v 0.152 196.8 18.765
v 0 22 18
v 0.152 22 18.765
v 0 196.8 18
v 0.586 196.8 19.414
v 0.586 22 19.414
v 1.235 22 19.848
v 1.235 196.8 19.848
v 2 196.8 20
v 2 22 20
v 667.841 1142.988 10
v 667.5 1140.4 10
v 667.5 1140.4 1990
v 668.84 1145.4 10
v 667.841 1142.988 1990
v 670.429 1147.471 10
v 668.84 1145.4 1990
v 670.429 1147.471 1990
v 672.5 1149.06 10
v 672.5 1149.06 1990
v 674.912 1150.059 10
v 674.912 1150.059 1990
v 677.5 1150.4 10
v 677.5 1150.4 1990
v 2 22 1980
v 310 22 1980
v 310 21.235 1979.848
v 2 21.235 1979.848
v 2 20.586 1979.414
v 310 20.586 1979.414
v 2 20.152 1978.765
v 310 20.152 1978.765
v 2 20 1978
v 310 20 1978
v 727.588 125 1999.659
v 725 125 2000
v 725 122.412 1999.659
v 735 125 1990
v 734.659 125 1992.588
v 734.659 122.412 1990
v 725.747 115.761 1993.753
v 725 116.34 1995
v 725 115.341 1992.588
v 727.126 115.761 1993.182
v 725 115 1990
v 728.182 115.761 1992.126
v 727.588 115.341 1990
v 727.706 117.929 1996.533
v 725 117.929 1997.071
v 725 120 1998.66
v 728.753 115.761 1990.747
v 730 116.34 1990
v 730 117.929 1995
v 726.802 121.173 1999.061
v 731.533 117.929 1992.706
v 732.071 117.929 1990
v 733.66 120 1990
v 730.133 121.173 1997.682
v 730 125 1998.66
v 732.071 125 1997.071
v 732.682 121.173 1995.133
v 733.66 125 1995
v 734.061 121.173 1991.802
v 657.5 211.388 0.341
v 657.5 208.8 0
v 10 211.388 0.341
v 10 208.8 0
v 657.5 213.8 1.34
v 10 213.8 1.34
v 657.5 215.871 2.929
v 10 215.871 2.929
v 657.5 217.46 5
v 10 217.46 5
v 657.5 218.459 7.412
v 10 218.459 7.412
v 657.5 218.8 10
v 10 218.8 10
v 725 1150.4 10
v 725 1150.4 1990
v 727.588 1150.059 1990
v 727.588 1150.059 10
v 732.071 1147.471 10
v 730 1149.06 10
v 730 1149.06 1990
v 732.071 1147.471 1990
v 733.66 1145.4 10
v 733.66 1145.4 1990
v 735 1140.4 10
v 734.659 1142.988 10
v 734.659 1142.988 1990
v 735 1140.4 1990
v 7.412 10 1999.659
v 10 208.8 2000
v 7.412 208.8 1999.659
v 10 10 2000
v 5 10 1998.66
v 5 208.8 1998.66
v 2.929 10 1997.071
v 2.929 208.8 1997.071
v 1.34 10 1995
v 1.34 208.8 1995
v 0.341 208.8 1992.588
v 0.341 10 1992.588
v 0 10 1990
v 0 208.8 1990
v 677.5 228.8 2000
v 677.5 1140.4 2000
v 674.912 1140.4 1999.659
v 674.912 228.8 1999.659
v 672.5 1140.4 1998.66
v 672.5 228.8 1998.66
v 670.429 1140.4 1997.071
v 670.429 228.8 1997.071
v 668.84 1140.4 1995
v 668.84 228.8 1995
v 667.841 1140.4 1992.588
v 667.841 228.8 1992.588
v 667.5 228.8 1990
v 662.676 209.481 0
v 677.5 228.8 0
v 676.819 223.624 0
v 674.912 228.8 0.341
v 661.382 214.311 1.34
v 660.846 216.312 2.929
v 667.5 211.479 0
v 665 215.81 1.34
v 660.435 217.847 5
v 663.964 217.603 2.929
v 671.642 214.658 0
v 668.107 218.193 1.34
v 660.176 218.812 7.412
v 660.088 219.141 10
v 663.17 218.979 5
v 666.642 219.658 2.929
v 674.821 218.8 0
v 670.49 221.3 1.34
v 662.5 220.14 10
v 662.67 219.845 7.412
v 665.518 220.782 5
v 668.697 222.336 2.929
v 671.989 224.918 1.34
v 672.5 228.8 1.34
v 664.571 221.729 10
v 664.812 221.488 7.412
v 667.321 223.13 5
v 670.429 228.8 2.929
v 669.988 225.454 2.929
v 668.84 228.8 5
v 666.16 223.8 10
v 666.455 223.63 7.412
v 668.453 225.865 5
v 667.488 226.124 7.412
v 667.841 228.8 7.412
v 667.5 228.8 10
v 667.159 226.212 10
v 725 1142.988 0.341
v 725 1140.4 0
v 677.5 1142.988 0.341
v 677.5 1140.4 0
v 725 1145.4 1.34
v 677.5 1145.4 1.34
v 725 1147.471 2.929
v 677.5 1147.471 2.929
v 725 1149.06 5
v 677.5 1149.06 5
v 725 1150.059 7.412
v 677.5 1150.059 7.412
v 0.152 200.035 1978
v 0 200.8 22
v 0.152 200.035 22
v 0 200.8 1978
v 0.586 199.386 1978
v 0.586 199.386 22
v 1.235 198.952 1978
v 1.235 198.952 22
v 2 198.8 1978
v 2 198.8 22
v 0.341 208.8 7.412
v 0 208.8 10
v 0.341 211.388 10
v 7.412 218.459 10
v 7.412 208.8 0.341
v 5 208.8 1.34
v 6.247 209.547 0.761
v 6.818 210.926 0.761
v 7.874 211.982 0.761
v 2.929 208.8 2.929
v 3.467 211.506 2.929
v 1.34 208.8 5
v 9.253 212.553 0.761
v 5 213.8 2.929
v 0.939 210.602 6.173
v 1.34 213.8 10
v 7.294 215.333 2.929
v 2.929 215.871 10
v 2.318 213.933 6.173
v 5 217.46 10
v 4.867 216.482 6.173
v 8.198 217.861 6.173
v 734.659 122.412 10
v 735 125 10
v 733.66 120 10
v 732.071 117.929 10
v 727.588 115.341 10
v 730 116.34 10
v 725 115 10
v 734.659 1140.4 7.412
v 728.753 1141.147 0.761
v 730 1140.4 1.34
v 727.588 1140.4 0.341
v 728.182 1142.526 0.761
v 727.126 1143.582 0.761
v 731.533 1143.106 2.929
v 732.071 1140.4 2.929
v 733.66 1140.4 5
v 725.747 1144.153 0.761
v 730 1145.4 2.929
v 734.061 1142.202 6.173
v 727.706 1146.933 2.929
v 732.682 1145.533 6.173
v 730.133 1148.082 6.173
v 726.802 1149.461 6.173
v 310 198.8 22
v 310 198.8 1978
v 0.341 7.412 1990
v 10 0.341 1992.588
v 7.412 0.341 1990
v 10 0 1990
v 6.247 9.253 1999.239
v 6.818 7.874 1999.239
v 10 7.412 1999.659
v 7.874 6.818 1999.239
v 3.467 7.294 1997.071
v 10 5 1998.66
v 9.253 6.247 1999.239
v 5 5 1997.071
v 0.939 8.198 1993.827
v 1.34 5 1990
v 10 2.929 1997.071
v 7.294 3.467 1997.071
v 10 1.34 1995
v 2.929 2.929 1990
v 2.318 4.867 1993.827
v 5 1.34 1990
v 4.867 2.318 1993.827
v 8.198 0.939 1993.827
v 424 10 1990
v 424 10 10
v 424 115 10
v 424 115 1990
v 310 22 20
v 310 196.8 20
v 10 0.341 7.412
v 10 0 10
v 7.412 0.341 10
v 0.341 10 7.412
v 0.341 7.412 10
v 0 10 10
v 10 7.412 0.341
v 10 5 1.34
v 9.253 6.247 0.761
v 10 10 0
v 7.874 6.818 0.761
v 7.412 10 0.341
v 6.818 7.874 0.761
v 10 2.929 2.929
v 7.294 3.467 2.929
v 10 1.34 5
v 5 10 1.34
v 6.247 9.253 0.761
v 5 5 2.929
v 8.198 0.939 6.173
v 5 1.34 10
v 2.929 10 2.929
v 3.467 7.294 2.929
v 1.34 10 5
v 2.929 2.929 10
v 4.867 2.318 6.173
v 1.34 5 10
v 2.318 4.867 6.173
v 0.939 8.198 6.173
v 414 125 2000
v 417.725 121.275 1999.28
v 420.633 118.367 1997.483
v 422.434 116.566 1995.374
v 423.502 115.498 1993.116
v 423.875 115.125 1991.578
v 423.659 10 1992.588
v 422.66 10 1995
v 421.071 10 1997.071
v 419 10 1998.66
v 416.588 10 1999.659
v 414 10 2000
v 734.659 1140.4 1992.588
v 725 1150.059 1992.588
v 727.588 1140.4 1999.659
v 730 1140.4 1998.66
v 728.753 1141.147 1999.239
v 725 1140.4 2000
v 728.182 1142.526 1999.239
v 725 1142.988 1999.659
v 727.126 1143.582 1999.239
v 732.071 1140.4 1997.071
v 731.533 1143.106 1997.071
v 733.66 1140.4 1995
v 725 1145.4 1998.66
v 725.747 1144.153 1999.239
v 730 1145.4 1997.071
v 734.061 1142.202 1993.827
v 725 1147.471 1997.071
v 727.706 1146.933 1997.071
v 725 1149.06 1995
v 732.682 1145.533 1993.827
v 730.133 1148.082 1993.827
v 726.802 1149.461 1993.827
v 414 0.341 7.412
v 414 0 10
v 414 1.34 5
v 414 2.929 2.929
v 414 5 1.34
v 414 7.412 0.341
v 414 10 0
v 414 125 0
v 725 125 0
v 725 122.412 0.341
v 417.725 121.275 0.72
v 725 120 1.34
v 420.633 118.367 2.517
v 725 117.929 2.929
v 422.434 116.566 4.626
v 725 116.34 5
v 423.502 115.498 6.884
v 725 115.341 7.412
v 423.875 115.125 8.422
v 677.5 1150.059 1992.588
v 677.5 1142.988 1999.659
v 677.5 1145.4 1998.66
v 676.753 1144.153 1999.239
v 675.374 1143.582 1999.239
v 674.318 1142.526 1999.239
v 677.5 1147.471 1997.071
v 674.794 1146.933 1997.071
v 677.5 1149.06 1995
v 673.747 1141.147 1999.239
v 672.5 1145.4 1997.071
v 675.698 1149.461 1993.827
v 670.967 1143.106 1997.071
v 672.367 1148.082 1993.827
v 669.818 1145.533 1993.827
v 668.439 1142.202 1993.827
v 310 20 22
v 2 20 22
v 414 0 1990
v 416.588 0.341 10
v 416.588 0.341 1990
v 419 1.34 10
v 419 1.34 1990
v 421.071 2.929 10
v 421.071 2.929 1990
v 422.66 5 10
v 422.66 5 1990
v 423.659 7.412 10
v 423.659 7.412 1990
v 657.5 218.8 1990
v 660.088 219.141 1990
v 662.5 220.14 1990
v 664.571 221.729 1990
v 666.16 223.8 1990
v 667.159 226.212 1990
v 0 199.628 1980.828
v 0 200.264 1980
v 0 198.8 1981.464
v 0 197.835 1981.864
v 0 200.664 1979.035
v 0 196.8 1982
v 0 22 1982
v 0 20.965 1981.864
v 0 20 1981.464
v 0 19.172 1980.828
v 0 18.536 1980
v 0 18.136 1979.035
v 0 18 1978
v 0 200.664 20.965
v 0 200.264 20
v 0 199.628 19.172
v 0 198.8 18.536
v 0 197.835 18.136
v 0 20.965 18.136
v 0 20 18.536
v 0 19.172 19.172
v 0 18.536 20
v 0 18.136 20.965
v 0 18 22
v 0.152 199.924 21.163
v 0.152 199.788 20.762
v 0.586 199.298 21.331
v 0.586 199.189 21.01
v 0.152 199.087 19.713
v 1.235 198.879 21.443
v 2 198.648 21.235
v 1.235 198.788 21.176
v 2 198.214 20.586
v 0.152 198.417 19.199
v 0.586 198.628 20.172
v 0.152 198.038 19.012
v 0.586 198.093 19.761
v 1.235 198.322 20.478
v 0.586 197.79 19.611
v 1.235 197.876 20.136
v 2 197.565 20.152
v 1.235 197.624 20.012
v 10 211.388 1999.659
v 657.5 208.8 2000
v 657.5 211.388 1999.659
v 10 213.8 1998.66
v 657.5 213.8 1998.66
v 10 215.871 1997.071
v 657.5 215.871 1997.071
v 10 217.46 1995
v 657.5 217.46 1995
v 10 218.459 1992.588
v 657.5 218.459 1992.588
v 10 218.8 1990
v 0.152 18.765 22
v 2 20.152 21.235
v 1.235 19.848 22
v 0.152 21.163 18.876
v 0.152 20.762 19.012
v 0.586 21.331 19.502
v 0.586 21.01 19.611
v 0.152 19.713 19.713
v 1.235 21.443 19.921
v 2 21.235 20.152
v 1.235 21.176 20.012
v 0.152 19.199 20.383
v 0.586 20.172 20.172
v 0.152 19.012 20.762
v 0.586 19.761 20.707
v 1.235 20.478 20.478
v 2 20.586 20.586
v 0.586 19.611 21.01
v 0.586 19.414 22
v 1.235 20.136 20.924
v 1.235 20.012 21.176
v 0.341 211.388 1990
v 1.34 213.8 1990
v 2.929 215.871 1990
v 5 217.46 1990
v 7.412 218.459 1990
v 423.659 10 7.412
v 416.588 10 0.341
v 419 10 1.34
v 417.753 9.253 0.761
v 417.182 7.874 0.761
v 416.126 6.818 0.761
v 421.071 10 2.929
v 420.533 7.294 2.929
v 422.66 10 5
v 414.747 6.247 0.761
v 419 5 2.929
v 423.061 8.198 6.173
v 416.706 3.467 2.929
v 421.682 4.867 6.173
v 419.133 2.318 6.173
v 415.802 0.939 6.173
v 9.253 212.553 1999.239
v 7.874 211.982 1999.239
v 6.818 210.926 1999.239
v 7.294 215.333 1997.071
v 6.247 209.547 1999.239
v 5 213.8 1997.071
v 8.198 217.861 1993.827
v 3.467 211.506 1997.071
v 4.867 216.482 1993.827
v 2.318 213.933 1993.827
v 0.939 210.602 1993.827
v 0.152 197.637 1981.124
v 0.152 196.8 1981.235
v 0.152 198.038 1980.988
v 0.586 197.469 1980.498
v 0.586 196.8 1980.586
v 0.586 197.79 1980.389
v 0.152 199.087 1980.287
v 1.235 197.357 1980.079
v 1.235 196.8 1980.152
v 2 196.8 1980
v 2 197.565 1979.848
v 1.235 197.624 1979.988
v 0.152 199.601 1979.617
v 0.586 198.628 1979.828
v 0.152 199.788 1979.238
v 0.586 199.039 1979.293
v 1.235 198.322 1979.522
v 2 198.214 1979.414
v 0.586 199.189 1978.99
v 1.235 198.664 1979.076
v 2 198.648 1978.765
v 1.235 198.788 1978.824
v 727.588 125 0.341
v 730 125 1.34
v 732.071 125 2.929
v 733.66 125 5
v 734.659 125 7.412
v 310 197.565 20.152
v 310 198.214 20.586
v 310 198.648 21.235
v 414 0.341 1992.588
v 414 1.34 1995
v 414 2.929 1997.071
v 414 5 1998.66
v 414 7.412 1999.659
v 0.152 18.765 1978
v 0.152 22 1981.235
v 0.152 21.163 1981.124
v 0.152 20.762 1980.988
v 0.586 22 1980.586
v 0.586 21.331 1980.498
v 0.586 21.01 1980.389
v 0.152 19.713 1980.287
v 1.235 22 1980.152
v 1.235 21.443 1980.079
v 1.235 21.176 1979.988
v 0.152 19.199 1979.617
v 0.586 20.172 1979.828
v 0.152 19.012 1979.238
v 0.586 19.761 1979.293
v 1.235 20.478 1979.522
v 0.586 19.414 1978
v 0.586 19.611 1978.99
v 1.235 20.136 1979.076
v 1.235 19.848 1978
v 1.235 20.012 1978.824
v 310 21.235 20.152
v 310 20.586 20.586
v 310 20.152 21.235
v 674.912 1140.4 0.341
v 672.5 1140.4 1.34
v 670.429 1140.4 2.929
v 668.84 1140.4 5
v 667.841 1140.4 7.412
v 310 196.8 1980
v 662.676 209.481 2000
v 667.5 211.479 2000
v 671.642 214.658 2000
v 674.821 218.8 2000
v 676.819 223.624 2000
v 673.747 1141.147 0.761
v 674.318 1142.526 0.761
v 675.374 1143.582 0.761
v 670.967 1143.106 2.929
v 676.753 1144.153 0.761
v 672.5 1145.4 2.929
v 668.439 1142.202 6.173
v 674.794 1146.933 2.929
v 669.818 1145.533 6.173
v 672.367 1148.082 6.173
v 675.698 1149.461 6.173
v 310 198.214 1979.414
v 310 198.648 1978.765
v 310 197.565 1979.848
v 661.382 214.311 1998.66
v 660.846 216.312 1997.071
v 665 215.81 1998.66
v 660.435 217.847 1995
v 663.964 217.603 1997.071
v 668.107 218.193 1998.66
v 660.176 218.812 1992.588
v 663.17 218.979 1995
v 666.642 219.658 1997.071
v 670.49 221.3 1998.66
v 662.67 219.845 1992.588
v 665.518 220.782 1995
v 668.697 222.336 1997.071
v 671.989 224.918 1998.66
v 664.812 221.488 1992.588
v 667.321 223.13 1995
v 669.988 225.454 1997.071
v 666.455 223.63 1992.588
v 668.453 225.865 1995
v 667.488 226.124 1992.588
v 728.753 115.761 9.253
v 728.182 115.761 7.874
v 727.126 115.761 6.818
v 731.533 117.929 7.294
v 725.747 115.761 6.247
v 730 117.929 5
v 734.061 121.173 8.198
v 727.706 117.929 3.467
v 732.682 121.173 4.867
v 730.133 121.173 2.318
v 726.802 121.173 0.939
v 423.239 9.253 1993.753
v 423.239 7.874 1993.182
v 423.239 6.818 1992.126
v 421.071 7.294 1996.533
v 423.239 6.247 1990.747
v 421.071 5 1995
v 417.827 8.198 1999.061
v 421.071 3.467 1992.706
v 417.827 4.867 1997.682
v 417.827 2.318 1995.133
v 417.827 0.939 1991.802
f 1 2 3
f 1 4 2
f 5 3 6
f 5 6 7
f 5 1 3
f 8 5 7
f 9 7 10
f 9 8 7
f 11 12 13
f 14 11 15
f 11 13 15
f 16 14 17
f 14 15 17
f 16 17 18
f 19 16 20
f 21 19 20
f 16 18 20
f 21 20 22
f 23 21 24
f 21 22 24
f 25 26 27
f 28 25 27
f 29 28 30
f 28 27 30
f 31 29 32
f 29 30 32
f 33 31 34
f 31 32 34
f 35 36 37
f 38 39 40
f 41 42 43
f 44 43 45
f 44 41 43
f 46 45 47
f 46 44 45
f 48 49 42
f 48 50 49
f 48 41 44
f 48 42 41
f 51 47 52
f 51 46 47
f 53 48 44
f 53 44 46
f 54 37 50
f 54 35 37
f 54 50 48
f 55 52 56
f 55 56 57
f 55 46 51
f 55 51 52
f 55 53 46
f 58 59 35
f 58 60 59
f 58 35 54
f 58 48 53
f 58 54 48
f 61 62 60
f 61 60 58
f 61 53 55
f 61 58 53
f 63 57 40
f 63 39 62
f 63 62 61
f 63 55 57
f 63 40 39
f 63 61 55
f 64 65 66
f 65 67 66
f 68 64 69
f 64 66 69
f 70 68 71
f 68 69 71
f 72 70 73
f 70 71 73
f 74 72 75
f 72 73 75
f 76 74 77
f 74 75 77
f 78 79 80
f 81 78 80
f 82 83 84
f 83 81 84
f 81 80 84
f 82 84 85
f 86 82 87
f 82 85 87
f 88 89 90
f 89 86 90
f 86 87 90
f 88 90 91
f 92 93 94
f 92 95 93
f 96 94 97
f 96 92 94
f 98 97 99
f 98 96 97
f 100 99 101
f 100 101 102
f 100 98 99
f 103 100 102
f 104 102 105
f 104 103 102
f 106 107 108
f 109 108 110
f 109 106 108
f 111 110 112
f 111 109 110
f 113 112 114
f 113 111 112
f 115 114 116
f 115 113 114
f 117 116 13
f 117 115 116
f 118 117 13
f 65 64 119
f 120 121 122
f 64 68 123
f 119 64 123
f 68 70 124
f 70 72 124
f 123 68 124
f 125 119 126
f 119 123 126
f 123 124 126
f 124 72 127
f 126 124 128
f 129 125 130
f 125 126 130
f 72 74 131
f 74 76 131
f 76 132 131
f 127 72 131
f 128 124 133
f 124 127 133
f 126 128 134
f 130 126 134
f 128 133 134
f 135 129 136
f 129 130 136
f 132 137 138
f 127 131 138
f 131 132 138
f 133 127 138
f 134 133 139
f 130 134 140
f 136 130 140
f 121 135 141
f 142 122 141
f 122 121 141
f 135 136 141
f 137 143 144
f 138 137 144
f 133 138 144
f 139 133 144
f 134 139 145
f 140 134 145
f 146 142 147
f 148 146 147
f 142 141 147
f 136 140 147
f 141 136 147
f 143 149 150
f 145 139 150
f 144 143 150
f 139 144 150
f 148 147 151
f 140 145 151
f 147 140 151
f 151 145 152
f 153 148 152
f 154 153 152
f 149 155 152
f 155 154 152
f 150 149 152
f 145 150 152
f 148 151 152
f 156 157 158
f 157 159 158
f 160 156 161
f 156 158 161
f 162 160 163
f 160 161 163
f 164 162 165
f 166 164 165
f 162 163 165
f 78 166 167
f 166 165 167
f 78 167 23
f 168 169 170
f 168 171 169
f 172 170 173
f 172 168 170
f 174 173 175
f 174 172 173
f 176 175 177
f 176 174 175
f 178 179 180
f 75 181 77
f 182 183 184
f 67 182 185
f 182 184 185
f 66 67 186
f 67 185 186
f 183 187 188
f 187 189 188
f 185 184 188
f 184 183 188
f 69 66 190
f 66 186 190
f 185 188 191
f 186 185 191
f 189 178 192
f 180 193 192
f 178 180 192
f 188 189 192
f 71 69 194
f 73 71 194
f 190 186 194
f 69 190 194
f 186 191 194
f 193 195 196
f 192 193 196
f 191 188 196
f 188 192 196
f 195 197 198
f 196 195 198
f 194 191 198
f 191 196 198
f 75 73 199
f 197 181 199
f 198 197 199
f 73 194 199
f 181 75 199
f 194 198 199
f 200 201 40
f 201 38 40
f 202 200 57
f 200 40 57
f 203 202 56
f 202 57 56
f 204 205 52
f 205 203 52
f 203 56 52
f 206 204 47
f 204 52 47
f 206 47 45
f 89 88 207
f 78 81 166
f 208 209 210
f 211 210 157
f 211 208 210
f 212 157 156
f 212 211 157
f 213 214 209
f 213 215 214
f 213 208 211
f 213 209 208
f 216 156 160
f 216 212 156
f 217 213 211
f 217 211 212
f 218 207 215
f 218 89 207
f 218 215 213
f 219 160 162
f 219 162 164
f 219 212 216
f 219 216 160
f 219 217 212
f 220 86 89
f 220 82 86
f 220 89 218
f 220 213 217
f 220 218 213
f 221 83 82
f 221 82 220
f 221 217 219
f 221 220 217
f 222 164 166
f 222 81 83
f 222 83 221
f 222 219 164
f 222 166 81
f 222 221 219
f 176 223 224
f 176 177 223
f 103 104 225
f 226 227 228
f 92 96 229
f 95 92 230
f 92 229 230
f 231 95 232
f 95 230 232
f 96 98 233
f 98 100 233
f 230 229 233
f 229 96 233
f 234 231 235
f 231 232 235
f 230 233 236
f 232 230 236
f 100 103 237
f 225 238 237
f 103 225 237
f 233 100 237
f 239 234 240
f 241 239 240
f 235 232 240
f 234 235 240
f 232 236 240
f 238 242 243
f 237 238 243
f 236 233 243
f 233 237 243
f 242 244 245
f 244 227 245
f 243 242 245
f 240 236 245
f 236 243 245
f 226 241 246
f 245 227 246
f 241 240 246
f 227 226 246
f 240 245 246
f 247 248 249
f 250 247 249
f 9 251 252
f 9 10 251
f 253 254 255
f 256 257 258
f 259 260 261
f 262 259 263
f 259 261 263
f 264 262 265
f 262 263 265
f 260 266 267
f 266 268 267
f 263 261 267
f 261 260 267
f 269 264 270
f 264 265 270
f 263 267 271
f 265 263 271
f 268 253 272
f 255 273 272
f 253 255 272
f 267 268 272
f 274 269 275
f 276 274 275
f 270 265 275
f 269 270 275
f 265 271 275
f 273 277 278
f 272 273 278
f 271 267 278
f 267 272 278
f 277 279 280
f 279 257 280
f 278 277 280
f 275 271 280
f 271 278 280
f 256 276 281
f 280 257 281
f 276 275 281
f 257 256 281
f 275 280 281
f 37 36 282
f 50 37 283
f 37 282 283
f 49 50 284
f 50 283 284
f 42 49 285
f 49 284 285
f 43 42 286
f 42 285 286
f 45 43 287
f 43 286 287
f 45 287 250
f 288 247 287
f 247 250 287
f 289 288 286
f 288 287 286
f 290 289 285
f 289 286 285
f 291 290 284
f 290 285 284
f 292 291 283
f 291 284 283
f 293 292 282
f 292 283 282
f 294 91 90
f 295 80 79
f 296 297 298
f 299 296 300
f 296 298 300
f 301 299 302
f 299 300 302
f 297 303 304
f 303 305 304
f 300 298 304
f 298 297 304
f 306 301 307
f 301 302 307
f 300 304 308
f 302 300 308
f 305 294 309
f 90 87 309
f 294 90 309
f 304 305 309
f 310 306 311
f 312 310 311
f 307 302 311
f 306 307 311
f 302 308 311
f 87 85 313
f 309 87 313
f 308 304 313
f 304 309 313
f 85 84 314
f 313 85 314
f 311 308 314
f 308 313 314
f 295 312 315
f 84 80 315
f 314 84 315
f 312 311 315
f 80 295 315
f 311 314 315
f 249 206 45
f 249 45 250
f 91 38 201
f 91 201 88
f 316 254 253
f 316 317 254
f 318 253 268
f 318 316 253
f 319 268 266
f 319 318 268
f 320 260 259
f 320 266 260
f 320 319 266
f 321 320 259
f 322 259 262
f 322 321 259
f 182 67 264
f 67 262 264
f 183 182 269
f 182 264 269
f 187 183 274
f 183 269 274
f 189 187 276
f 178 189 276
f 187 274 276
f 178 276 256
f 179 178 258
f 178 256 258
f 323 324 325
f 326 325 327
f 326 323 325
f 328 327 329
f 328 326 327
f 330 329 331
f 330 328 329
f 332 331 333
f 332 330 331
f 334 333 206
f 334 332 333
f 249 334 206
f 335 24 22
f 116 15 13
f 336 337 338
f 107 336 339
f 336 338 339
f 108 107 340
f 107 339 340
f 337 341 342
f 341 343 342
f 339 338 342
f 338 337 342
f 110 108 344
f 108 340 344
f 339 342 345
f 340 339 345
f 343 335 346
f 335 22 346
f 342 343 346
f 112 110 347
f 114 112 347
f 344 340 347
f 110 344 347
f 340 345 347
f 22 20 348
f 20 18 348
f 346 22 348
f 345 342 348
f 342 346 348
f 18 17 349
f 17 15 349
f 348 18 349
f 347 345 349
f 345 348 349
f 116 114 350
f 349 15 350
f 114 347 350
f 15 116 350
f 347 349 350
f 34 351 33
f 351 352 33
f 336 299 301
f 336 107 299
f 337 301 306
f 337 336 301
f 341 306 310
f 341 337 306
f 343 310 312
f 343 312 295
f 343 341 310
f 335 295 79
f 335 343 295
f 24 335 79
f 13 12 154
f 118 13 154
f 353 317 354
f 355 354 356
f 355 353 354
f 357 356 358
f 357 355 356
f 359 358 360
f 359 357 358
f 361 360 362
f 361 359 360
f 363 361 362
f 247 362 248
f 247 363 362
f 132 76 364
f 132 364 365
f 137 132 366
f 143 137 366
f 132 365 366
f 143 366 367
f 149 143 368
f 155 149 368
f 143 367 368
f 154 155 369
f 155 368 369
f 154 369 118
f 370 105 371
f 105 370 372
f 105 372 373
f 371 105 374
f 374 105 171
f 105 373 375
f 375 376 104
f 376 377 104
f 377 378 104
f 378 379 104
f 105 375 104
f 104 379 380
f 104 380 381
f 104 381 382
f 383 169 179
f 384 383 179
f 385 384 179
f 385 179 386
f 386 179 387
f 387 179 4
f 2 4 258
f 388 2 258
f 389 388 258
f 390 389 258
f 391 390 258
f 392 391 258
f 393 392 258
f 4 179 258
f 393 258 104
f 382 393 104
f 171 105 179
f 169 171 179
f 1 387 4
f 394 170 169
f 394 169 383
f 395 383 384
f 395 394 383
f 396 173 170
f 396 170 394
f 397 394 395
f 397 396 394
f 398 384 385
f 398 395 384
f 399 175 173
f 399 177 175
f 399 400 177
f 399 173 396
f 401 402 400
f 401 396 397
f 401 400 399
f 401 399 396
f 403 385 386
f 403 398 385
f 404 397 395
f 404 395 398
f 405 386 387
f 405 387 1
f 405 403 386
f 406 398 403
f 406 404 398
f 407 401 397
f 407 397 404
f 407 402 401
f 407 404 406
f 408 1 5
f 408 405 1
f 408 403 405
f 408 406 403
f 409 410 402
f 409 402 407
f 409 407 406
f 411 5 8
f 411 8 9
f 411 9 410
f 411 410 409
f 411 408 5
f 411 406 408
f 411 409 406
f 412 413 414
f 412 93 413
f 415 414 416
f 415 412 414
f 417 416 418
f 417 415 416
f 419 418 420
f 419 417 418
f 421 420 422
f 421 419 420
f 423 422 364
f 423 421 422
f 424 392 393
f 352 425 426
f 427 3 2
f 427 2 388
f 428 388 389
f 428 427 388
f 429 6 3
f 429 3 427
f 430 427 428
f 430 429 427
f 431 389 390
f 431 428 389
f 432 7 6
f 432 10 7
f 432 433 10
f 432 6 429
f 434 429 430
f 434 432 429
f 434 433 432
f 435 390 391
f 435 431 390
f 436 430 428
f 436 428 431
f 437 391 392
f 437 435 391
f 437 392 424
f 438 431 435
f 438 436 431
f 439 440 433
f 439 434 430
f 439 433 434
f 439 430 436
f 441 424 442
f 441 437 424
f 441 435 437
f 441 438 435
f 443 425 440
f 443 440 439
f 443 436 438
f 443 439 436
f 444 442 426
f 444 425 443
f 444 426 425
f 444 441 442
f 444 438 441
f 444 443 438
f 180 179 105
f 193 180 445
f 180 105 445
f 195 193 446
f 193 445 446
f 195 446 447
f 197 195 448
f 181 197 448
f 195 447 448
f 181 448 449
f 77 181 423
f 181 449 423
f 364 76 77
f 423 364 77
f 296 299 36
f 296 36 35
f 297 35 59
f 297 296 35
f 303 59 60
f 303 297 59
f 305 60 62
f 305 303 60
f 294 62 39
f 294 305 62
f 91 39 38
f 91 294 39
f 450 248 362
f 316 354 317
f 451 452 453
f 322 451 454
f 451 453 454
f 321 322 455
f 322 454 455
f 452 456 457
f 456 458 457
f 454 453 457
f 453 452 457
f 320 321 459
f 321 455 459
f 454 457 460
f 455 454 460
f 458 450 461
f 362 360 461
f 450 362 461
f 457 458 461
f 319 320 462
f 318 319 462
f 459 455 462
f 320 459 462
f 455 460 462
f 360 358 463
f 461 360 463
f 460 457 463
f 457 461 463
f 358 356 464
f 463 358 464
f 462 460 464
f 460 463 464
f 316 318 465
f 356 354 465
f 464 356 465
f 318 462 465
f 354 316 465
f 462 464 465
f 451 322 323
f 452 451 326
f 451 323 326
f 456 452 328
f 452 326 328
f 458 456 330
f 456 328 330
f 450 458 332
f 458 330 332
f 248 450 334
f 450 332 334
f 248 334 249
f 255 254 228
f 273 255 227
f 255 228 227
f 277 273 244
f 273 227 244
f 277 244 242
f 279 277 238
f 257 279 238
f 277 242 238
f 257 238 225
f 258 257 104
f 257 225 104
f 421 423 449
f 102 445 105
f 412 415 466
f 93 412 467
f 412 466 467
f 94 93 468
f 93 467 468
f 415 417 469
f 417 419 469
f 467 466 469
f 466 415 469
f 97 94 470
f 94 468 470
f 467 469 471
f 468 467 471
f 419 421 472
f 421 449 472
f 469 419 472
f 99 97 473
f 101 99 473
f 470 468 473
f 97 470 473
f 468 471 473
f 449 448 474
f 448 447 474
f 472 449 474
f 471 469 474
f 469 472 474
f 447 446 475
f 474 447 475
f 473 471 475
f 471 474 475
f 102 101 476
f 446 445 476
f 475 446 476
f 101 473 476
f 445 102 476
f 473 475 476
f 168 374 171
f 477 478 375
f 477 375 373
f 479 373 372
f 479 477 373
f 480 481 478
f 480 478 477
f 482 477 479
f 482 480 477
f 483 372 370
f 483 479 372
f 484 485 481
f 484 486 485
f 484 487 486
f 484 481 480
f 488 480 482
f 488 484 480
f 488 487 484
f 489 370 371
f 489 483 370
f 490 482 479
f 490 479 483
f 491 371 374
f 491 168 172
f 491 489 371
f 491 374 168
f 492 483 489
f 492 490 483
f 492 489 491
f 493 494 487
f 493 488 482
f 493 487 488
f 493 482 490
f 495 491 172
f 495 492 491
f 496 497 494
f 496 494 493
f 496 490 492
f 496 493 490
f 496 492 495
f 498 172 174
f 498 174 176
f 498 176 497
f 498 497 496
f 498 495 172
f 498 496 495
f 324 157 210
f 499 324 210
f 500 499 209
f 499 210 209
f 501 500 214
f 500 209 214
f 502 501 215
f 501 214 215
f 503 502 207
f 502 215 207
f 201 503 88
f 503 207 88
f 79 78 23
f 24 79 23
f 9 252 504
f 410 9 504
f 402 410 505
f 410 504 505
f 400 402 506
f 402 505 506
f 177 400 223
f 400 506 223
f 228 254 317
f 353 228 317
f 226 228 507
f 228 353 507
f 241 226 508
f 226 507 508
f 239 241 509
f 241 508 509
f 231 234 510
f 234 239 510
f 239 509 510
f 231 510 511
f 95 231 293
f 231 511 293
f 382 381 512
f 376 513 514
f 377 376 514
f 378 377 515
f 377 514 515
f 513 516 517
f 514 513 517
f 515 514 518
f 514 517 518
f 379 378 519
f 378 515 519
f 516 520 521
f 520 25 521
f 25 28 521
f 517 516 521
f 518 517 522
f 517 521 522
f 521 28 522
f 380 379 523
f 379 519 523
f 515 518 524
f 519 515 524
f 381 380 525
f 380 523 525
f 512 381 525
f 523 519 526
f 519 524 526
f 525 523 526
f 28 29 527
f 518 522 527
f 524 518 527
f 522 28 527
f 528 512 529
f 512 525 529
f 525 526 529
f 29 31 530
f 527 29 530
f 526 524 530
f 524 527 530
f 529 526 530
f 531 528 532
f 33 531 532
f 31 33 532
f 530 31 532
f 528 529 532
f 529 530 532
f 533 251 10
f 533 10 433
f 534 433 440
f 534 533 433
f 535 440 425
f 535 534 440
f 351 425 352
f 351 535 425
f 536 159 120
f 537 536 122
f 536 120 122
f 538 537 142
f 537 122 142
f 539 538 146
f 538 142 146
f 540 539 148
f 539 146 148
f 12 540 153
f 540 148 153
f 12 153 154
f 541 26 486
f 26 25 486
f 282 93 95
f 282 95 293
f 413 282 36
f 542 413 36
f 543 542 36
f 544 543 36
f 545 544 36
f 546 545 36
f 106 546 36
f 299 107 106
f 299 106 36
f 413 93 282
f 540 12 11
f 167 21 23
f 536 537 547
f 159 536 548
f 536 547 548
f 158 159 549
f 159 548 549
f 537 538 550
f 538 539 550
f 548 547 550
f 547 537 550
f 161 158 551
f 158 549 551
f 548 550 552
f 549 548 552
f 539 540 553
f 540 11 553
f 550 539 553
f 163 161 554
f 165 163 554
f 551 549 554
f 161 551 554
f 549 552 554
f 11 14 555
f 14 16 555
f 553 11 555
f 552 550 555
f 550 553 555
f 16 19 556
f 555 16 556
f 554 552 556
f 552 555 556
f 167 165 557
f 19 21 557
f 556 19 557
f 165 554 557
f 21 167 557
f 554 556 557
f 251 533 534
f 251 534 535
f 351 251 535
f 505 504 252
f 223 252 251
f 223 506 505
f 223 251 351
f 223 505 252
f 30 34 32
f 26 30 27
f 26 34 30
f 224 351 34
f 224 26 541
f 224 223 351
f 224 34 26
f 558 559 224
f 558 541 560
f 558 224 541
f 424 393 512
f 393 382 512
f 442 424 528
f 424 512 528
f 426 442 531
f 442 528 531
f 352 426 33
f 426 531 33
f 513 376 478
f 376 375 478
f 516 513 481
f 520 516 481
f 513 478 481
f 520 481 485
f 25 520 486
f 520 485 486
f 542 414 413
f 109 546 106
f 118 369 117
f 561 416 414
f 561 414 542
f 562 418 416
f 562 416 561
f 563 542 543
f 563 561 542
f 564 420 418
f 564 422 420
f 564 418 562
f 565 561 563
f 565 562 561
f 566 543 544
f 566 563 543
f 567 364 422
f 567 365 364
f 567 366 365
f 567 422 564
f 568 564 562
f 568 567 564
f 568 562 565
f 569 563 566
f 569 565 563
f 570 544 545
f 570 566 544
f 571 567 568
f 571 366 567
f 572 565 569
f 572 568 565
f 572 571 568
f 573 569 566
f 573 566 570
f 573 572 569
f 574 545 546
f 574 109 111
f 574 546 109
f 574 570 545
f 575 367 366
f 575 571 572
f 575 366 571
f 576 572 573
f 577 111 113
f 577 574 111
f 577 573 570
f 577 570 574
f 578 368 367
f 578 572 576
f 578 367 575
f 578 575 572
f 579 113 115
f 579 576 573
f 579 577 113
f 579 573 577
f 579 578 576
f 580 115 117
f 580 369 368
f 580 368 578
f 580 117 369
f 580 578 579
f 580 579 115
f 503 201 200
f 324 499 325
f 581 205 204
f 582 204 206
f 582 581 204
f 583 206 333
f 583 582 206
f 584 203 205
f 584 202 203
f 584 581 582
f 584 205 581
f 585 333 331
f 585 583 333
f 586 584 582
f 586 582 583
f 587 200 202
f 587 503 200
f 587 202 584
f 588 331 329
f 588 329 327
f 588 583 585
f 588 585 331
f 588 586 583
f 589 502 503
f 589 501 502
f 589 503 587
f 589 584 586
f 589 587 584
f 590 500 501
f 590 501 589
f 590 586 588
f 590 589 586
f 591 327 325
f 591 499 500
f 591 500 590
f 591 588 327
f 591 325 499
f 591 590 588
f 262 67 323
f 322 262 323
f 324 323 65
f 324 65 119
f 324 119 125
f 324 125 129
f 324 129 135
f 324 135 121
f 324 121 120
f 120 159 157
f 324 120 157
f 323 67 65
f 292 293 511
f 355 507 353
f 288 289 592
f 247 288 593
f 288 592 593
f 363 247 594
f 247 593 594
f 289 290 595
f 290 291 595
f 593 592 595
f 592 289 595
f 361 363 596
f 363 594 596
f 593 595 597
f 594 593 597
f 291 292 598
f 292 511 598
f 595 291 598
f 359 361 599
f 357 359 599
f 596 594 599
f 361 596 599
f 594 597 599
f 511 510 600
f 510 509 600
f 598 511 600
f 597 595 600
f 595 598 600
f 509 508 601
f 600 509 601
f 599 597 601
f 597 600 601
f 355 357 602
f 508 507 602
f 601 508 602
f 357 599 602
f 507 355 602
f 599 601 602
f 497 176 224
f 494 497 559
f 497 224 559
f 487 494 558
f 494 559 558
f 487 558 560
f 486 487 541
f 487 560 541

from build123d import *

# Parameters (mm, degrees)
BOSS_EXTRUDE1_DEPTH = 2000
CUT_EXTRUDE1_REACH  = 2423.496
SKETCH3_W           = 311
SKETCH3_H           = 115
SKETCH2_W           = 1960
SKETCH2_H           = 178.8
CUT_EXTRUDE2_DEPTH  = 310
FILLET2_R           = 10
FILLET3_R           = 2


with BuildPart() as part:
    # Sketch1 → Boss-Extrude1 (new body)
    with BuildSketch(Plane.XY):
        Polygon((0, 0), (735, 0), (735, 1150.4), (667.5, 1150.4), (667.5, 218.8), (0, 218.8), align=None)
    extrude(amount=BOSS_EXTRUDE1_DEPTH)

    # Sketch3 → Cut-Extrude1 (cut, up to next)
    with BuildSketch(Plane(origin=(0, 0, 0), x_dir=(-1, 0, 0), z_dir=(0, 0, -1)), mode=Mode.PRIVATE) as cut_extrude1_sk1:
        with Locations((-579.5, 57.5)):
            Rectangle(SKETCH3_W, SKETCH3_H)
    cut_extrude1_tool1 = extrude(cut_extrude1_sk1.sketch, amount=-CUT_EXTRUDE1_REACH, mode=Mode.PRIVATE) & part.part
    add(cut_extrude1_tool1.solids().sort_by_distance((579.5, 57.5, 0))[0], mode=Mode.SUBTRACT)

    # Sketch2 → Cut-Extrude2 (cut)
    with BuildSketch(Plane.ZY):
        with Locations((1000, 109.4)):
            Rectangle(SKETCH2_W, SKETCH2_H)
    extrude(amount=-CUT_EXTRUDE2_DEPTH, mode=Mode.SUBTRACT)

    # Fillet2
    fillet2_edges = [part.edges().sort_by_distance(p)[0] for p in [
        (735, 1150.4, 1000),
        (0, 0, 1000),
        (0, 218.8, 1000),
        (667.5, 218.8, 1000),
        (667.5, 1150.4, 1000),
        (333.75, 218.8, 2000),
        (0, 109.4, 2000),
        (735, 632.7, 0),
        (212, 0, 2000),
        (735, 632.7, 2000),
        (579.5, 115, 2000),
        (735, 115, 1000),
        (424, 57.5, 2000),
        (424, 0, 1000),
        (424, 57.5, 0),
        (579.5, 115, 0),
        (701.25, 1150.4, 2000),
        (212, 0, 0),
        (0, 109.4, 0),
        (333.75, 218.8, 0),
        (667.5, 684.6, 0),
        (701.25, 1150.4, 0),
        (667.5, 684.6, 2000),
    ]]
    fillet(fillet2_edges, radius=FILLET2_R)

    # Fillet3
    fillet3_edges = [part.edges().sort_by_distance(p)[0] for p in [
        (155, 198.8, 1980),
        (155, 20, 1980),
        (155, 20, 20),
        (155, 198.8, 20),
        (0, 109.4, 1980),
        (0, 198.8, 1000),
        (0, 109.4, 20),
        (0, 20, 1000),
    ]]
    fillet(fillet3_edges, radius=FILLET3_R)


solid = part.part
